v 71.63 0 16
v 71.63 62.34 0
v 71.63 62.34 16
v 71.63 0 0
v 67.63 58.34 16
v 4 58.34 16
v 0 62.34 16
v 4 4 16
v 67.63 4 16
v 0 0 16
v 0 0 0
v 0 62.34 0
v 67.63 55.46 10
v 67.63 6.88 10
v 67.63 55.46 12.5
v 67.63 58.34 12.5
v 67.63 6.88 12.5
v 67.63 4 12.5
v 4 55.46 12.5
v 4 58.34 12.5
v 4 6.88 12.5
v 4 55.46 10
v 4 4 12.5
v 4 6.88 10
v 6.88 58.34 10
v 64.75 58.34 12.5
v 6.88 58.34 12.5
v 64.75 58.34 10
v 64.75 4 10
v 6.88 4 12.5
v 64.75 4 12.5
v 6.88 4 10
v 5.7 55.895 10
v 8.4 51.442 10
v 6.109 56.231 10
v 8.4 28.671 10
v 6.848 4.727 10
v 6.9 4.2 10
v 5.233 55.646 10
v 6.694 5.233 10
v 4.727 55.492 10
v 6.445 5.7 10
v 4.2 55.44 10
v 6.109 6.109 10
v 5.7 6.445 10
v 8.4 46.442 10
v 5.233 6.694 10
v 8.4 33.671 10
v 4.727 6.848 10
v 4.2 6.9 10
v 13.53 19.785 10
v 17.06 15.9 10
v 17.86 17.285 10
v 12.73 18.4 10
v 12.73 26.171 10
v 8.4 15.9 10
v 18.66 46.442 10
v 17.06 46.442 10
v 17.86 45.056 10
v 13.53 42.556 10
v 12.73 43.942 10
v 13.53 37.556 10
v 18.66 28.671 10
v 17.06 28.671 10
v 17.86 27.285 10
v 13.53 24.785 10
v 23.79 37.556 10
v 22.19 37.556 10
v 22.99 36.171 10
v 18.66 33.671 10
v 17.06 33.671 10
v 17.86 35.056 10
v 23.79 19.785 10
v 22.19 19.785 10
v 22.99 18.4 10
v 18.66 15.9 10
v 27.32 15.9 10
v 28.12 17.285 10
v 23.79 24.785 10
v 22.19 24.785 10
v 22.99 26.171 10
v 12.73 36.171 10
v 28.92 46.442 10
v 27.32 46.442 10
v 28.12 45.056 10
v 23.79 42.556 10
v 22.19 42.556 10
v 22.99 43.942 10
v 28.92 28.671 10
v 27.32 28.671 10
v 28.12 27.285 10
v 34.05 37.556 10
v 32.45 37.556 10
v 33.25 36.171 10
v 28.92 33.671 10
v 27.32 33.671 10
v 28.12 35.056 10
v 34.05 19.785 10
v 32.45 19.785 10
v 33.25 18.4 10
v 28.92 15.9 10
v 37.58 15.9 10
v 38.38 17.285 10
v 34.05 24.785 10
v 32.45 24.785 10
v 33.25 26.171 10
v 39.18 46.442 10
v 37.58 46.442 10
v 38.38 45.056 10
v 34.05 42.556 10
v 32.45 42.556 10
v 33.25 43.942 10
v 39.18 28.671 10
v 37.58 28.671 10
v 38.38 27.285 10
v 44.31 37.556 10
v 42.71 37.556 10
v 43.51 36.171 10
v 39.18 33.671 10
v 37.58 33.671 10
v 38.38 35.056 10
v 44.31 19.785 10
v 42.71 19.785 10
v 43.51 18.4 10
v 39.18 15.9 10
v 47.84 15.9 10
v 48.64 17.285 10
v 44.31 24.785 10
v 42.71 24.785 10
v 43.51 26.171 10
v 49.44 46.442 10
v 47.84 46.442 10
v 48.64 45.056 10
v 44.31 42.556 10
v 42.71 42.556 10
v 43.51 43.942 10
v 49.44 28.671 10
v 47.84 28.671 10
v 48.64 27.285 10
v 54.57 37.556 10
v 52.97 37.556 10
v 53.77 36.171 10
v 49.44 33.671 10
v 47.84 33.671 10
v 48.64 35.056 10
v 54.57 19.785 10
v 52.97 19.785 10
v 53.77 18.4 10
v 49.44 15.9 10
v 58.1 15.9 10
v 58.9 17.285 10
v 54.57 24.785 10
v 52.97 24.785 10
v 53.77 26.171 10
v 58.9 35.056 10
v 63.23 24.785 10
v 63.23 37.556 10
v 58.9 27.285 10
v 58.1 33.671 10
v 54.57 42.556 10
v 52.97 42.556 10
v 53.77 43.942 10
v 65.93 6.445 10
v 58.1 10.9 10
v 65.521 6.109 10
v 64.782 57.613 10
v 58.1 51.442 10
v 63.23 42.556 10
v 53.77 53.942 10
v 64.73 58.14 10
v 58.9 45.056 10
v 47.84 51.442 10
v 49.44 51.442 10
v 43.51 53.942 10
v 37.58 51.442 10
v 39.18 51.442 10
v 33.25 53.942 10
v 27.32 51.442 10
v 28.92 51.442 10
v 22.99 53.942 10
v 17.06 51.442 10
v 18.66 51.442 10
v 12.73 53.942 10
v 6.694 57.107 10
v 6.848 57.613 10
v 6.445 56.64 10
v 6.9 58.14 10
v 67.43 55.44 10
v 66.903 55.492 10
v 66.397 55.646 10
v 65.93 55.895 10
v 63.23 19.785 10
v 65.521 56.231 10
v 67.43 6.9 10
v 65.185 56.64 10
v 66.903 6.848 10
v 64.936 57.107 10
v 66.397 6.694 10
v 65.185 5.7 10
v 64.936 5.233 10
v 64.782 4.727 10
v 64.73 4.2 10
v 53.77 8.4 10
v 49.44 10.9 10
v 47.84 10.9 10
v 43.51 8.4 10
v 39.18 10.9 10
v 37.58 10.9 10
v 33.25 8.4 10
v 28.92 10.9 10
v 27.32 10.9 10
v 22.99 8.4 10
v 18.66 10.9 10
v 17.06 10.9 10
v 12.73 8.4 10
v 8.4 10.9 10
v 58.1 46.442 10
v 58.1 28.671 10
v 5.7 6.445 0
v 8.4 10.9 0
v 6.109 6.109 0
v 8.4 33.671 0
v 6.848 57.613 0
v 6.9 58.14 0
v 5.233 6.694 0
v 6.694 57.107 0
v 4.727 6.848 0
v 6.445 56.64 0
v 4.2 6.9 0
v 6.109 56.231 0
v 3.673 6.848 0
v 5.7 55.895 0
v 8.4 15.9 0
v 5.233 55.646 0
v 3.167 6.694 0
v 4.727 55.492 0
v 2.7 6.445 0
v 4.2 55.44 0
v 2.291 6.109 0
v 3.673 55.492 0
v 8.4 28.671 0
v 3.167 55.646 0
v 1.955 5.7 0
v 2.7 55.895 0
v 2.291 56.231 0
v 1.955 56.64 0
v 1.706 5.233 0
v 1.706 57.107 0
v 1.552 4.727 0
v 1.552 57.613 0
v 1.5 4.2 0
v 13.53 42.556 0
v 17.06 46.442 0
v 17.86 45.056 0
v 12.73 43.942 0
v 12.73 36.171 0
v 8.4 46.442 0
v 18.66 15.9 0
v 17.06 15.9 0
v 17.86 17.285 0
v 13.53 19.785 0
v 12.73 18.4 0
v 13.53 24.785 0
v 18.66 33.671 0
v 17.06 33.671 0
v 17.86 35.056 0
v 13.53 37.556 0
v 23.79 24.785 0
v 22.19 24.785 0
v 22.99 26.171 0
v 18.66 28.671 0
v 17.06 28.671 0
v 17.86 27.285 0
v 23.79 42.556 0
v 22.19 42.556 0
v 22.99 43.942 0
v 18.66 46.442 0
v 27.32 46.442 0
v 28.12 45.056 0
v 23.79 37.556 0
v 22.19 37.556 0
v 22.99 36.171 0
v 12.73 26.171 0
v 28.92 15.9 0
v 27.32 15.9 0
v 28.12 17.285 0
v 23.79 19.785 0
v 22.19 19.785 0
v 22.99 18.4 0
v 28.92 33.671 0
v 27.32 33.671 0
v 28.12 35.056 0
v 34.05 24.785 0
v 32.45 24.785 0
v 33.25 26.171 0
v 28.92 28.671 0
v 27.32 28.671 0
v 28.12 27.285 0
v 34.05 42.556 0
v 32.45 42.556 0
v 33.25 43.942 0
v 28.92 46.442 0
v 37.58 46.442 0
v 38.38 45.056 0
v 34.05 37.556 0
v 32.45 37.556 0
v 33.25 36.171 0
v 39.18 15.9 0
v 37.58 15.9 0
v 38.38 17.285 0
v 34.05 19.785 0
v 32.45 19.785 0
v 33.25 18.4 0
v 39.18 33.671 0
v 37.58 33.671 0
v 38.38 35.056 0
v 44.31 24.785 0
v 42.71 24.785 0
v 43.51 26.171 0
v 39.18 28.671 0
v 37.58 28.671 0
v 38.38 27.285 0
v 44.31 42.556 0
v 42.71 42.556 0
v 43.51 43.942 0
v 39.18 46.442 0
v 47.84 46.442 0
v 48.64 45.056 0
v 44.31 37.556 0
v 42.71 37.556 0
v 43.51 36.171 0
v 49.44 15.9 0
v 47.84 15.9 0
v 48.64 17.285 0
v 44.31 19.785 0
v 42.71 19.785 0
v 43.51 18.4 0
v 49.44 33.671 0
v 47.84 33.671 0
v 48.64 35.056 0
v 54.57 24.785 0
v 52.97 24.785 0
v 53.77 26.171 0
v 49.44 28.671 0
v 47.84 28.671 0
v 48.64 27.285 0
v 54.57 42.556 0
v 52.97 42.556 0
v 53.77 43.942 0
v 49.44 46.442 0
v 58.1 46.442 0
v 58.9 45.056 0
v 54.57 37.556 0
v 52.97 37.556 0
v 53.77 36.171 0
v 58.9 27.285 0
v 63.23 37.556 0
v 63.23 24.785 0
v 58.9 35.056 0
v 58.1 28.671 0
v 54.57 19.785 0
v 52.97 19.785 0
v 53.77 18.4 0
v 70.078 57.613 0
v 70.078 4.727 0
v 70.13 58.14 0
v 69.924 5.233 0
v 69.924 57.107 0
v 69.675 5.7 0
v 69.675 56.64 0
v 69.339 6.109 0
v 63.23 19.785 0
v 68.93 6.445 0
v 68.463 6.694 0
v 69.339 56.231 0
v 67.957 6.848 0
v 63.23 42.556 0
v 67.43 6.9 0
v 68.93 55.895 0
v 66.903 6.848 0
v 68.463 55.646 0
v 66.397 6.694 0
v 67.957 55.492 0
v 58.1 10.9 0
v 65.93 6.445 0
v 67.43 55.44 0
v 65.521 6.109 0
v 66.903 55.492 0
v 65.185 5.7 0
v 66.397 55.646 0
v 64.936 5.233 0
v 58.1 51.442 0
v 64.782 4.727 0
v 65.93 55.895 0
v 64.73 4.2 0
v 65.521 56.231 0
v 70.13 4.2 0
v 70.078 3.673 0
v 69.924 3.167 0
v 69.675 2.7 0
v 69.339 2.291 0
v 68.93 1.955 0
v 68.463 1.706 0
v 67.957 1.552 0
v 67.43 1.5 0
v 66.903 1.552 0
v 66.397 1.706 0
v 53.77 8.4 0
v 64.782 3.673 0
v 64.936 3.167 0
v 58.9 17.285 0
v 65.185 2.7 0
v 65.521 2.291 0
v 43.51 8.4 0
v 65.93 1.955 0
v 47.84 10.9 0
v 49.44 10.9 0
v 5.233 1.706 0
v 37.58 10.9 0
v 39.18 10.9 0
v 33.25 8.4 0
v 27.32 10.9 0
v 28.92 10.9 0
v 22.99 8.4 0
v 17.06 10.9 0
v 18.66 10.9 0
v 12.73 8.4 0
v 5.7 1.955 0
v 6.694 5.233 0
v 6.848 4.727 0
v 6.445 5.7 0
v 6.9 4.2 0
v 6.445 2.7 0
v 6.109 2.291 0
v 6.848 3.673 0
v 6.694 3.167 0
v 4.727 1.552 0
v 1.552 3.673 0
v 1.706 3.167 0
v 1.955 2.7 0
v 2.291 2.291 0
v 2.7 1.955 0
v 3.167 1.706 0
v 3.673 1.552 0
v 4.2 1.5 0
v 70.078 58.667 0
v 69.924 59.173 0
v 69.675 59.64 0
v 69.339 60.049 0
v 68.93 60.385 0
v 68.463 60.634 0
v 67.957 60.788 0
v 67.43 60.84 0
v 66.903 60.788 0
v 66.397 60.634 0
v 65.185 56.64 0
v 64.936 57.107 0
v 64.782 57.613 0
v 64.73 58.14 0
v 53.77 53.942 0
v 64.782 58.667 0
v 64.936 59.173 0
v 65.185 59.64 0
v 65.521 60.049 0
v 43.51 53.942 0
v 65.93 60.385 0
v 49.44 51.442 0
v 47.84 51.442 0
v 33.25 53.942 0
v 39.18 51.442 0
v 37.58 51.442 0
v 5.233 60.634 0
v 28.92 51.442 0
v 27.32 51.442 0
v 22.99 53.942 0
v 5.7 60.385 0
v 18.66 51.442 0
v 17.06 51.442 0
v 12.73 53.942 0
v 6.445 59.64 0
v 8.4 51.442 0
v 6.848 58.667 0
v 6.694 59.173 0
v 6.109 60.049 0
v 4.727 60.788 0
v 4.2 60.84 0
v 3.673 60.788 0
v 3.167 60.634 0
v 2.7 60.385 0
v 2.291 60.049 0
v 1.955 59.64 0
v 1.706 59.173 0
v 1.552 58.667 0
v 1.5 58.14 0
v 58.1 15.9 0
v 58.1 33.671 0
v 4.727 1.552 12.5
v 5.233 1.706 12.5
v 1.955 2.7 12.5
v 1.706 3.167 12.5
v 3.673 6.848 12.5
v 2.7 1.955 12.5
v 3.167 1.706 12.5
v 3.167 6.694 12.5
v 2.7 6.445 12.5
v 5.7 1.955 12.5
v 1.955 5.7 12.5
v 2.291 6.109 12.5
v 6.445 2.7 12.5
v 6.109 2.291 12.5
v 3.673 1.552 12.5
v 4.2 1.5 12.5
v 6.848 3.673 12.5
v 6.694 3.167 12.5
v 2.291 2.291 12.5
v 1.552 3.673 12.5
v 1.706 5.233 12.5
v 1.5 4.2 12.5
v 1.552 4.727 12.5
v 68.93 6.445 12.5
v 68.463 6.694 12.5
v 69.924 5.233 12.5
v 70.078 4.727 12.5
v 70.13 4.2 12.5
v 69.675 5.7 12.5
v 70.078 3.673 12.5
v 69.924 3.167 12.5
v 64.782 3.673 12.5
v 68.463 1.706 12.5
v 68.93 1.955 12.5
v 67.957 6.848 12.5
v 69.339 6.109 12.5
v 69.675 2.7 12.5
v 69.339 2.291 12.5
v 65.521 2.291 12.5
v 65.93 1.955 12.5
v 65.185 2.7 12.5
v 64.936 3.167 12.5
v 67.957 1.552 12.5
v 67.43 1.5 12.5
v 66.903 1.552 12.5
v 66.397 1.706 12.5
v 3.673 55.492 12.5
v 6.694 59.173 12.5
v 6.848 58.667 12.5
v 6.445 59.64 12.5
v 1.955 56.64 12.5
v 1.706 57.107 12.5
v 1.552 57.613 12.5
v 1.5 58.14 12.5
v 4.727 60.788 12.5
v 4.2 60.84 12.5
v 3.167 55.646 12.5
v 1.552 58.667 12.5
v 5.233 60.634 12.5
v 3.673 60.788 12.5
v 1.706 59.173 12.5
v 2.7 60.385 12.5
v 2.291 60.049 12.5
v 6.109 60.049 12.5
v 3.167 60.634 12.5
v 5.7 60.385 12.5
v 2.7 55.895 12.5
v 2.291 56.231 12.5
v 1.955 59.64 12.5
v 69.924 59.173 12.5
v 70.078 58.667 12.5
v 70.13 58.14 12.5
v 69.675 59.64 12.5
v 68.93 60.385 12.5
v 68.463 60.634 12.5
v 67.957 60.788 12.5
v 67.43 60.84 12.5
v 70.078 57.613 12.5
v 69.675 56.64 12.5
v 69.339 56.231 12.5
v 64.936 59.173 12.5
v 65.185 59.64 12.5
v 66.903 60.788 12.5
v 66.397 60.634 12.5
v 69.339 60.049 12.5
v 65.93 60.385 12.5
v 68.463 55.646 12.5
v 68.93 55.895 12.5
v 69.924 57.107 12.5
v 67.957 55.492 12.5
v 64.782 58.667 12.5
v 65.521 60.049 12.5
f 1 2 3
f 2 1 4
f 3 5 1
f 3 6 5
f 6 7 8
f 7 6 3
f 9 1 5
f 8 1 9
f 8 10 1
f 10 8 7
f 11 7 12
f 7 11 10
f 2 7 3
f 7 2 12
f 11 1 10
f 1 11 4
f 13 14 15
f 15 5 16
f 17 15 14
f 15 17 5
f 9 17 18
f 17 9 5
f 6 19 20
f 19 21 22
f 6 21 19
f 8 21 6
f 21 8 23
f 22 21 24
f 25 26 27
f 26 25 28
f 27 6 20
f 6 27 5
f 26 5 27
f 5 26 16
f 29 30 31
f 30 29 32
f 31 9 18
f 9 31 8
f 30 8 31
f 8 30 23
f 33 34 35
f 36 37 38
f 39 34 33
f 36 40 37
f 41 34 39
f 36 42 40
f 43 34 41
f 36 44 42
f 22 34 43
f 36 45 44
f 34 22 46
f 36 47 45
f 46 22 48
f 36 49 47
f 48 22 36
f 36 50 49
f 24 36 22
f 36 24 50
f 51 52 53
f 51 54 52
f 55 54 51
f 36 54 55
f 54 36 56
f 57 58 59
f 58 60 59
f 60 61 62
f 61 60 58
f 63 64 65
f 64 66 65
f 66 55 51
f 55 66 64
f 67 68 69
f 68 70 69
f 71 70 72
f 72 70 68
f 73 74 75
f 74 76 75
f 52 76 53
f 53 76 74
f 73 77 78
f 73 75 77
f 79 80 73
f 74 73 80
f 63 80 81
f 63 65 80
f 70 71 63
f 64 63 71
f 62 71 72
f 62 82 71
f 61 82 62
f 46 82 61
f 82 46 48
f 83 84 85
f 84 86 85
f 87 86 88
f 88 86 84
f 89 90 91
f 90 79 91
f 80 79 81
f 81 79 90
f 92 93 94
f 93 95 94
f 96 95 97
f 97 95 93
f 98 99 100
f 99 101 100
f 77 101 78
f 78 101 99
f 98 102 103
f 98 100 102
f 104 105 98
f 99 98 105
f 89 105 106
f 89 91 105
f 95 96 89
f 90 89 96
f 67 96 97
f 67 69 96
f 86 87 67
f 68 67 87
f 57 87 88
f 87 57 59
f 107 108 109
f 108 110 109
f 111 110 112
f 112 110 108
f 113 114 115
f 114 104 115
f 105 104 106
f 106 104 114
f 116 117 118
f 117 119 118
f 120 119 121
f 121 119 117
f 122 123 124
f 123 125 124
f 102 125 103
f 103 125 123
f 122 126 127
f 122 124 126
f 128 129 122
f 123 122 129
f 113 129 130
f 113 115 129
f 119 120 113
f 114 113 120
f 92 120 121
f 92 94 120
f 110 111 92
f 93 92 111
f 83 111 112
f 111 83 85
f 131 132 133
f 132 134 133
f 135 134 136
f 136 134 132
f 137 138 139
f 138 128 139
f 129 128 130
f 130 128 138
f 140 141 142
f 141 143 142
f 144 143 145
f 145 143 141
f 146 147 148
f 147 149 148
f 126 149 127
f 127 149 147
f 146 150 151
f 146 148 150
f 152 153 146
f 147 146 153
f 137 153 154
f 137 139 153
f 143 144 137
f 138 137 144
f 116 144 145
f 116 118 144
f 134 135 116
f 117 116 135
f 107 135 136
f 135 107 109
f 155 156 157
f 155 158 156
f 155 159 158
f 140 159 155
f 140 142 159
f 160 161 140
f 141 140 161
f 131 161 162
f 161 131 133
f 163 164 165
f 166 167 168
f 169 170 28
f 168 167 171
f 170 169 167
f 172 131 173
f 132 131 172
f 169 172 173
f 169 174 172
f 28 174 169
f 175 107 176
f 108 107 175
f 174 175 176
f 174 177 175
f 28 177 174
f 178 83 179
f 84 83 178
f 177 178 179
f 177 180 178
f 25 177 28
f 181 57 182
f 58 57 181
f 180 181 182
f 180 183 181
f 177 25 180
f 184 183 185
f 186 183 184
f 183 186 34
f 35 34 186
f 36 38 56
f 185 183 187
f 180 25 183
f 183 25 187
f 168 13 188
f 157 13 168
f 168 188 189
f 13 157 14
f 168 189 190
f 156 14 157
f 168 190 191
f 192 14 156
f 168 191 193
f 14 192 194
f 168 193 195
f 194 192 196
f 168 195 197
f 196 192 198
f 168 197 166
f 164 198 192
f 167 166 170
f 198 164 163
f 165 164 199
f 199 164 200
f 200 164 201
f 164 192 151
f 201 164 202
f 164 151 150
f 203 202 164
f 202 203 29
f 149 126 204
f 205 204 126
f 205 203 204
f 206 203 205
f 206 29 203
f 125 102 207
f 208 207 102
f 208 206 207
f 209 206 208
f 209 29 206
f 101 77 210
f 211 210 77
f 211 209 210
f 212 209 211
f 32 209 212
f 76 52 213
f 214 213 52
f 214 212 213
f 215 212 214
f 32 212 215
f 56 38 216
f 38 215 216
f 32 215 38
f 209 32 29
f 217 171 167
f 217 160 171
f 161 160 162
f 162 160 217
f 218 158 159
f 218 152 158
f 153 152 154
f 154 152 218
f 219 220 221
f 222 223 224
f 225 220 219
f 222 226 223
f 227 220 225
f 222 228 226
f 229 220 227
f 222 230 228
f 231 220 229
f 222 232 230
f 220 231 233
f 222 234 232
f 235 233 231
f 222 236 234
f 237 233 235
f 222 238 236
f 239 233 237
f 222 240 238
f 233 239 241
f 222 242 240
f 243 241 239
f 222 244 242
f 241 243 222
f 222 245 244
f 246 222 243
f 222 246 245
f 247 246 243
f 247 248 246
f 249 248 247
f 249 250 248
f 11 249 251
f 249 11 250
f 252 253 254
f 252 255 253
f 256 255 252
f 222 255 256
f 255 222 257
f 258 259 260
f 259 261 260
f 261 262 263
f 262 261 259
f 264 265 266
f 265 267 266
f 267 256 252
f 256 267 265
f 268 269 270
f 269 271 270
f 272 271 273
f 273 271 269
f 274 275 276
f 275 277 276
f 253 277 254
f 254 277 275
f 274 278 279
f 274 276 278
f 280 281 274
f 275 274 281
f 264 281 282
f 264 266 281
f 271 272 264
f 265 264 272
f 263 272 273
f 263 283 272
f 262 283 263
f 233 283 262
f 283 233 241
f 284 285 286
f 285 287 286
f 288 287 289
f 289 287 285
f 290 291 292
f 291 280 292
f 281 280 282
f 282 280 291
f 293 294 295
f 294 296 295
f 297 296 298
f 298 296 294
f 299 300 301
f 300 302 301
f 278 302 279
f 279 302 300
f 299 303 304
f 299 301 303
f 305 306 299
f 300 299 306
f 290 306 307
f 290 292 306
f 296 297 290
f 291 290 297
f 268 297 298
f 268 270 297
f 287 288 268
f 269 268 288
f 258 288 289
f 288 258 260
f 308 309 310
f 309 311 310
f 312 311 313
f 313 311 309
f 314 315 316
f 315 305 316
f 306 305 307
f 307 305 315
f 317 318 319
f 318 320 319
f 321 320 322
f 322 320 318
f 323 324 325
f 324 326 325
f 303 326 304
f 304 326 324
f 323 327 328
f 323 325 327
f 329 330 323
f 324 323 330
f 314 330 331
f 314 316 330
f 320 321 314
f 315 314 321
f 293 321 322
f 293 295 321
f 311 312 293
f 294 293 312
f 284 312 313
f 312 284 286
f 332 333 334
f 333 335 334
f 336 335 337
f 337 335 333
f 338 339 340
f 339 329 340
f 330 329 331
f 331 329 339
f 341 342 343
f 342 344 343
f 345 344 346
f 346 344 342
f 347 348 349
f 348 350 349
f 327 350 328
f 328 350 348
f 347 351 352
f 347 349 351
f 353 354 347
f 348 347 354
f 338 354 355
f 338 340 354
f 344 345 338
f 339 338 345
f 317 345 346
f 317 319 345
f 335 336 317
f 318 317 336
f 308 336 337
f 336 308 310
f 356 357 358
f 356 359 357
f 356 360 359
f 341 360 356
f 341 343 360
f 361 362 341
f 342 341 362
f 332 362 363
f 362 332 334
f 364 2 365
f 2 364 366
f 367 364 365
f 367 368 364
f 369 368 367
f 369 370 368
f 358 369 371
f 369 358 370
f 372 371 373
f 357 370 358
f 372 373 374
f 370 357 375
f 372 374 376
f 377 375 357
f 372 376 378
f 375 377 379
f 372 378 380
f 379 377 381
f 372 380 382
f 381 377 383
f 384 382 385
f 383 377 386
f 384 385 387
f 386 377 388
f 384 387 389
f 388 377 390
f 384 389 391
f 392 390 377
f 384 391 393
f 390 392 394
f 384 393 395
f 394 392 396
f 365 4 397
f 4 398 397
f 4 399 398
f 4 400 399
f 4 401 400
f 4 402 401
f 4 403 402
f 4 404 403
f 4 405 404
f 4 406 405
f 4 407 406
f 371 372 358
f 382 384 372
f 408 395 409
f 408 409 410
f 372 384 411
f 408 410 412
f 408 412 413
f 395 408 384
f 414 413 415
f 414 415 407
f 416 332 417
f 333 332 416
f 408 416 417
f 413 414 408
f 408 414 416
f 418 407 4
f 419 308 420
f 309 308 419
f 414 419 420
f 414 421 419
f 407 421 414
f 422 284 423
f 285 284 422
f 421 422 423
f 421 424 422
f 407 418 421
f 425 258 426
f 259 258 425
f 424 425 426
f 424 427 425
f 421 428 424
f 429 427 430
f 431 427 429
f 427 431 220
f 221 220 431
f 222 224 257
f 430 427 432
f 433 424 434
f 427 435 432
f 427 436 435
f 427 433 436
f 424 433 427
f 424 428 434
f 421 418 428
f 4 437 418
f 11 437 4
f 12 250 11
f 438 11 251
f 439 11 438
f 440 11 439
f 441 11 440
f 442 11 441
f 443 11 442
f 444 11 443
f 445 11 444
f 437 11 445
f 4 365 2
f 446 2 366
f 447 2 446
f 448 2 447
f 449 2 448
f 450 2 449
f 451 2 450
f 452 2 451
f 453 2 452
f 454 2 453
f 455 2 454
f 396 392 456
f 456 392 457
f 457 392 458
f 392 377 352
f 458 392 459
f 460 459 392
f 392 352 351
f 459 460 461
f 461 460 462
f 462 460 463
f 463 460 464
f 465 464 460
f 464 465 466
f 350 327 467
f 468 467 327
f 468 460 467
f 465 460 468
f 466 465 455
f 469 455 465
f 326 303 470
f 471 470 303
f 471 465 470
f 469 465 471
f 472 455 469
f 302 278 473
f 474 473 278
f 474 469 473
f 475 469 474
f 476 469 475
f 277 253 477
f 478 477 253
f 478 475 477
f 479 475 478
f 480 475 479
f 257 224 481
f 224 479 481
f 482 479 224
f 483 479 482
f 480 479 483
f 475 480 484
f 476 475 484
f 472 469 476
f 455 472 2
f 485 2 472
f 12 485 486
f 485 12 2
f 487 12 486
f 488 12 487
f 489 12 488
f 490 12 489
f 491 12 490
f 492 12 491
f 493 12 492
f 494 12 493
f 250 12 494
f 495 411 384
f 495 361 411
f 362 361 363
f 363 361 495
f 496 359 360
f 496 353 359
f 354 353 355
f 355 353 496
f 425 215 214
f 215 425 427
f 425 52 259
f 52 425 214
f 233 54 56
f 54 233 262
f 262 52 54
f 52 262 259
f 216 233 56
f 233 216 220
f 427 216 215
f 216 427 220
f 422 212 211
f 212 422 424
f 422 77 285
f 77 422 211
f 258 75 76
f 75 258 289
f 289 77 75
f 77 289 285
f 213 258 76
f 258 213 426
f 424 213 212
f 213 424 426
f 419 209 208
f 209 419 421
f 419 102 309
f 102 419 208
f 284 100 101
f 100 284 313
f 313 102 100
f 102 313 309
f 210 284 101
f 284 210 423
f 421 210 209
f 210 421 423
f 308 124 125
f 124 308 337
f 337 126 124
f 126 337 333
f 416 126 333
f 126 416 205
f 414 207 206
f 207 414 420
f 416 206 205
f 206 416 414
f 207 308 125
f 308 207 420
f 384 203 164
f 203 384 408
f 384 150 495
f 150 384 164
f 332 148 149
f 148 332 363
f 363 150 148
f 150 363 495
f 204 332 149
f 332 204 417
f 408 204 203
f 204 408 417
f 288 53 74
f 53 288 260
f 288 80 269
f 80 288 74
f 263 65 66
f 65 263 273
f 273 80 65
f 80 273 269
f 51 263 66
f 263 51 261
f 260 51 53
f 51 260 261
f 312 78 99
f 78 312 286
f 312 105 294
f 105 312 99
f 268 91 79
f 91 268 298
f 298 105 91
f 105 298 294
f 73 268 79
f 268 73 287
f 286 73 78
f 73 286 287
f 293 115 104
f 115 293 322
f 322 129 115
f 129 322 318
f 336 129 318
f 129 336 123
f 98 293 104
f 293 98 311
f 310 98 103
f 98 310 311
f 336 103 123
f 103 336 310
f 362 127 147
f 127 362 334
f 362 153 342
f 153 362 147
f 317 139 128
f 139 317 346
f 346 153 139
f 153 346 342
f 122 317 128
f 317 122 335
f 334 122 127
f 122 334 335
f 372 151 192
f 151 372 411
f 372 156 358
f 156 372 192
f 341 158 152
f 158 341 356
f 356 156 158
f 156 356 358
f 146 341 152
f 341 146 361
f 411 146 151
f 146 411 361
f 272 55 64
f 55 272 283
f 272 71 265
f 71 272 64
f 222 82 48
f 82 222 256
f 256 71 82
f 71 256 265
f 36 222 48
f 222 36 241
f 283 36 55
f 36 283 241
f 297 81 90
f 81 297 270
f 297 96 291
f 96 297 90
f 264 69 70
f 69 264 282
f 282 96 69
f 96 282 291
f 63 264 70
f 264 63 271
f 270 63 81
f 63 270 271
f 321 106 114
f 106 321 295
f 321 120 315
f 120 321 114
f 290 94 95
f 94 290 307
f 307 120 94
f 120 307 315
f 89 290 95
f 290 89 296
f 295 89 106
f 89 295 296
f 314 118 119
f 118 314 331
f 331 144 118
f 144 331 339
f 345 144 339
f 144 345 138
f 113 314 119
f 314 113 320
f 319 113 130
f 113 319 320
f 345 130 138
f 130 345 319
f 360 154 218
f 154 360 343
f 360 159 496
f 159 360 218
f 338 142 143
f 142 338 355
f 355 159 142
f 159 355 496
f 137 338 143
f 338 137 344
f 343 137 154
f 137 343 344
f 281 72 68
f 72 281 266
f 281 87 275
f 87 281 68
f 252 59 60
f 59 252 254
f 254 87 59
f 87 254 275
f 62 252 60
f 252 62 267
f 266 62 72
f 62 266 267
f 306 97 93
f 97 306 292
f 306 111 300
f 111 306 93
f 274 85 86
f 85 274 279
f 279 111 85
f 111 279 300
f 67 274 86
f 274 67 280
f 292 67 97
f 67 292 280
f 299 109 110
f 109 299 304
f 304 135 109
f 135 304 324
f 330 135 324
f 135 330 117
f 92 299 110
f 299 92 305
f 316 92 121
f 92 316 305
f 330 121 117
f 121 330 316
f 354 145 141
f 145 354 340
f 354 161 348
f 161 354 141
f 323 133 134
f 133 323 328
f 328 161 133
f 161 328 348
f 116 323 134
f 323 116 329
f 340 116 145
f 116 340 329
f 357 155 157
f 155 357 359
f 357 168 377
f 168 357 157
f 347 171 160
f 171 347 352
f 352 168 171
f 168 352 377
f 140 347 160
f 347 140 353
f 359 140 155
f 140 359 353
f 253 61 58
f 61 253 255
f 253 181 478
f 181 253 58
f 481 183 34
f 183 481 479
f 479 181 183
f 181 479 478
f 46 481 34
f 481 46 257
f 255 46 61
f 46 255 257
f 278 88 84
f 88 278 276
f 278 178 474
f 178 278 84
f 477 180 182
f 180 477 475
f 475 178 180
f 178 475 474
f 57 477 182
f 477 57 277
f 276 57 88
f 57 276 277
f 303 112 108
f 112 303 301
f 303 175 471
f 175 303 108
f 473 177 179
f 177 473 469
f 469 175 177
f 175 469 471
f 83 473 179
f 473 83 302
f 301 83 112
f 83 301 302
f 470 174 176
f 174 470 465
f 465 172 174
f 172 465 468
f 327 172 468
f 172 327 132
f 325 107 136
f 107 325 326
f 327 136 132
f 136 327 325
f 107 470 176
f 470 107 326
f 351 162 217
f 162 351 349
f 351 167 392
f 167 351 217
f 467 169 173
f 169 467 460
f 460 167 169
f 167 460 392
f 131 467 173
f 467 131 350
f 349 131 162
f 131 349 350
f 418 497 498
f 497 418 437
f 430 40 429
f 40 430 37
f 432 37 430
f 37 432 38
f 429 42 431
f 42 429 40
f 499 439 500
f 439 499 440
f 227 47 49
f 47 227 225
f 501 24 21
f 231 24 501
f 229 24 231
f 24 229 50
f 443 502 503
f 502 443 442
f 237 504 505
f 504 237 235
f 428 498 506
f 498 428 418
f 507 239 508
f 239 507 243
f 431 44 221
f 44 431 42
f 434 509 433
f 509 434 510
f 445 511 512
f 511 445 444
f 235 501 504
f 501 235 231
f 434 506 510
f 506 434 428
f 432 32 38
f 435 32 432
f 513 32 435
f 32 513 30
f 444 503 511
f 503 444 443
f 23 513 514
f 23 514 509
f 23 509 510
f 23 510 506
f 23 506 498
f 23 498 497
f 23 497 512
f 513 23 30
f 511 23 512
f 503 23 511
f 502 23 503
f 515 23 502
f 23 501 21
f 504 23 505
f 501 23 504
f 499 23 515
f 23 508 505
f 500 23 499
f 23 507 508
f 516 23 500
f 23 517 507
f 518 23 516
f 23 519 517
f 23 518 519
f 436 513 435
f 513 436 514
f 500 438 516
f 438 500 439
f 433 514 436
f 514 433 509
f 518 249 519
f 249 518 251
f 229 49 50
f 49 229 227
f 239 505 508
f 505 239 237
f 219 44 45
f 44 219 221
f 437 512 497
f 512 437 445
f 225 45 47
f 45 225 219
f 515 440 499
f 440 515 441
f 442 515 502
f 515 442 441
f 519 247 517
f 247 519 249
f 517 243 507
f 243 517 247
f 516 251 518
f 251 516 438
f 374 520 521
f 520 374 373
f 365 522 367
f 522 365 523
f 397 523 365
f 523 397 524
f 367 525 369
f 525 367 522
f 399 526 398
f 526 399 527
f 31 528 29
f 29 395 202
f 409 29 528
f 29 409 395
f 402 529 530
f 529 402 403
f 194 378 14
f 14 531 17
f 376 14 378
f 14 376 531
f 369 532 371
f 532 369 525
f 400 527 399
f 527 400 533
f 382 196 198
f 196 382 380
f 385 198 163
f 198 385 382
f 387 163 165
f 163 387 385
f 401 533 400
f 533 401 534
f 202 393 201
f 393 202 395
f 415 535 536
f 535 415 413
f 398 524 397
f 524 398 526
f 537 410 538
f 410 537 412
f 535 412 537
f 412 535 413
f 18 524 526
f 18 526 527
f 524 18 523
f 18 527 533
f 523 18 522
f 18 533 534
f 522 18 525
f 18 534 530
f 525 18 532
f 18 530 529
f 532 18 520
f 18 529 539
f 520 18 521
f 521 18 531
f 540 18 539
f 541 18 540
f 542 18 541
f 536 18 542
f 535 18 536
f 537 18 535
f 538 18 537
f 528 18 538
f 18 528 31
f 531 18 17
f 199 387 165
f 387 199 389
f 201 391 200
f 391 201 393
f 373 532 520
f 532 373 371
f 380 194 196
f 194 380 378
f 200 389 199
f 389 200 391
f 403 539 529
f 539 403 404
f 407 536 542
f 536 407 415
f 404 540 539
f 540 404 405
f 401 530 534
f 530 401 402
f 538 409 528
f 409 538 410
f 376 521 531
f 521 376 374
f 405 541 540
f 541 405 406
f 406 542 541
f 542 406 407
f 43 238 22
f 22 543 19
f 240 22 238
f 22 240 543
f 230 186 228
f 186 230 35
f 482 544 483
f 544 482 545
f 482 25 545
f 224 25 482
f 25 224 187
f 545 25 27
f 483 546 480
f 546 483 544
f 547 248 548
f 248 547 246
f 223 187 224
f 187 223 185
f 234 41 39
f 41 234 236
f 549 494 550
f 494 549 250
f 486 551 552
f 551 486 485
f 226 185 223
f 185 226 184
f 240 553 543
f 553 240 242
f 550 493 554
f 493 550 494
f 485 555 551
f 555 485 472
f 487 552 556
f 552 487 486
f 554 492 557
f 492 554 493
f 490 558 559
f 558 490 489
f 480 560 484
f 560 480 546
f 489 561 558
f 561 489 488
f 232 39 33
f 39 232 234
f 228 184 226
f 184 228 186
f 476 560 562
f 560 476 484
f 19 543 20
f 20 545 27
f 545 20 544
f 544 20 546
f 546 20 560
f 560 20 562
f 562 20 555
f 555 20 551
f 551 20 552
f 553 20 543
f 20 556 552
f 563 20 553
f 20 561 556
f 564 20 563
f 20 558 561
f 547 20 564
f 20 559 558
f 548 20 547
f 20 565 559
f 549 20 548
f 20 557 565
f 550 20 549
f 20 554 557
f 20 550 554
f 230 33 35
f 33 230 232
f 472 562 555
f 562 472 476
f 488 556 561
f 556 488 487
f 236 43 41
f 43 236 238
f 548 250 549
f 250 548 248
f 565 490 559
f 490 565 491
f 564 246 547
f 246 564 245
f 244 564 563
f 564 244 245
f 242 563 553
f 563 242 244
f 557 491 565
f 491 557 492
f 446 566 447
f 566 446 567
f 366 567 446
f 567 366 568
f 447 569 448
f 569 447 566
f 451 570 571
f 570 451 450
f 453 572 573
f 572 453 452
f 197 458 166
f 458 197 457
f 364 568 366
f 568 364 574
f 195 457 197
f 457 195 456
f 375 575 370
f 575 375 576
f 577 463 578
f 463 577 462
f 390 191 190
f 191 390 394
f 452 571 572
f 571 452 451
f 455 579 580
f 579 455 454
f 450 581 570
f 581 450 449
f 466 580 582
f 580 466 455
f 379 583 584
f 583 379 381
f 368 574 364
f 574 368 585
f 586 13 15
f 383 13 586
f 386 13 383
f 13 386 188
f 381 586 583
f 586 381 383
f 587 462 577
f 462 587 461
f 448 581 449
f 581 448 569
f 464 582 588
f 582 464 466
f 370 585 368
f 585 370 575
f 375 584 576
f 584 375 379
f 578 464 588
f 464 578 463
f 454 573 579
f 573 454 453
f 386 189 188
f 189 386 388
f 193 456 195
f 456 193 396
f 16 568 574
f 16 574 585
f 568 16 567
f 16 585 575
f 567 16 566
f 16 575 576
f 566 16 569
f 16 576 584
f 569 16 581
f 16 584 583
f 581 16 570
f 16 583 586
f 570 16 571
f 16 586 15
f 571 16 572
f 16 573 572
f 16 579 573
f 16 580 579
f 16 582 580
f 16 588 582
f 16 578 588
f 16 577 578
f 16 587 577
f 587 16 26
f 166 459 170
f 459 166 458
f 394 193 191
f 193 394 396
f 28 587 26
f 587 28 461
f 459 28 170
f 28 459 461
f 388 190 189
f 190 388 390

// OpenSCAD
$fn = 32;

// ----------------------------------------------------------------------
// Honeycomb panel: 71.63 x 62.34 mm, 25 cells of 10 mm
// ----------------------------------------------------------------------

// --- parameters (mm) ---
panel_w = 71.63;          // panel width
panel_d = 62.34;          // panel depth
thick = 10;               // panel thickness
cell_r = 5;               // hex cell circumradius
pitch = 10.26;            // hex cell pitch (centre to centre)
web = 1.6;                // web between the cells
columns = 5;              // columns of cells
rows = 5;                 // rows of cells
cell_count = 25;          // total cells
shift_x = 12.73;          // first cell offset in x
shift_y = 13.4;           // first cell offset in y
mount_d = 5.4;            // corner mounting holes
hole_off = 4.2;           // mounting hole offset from the corners
rim_h = 16;               // rim height
rim_t = 4;                // rim wall thickness

difference() {
  union() {
    cube([panel_w, panel_d, thick]);
    /* rim around the panel, sunk 1 mm into the plate */
    translate([0, 0, thick - 1]) difference() {
      cube([panel_w, panel_d, rim_h - thick + 1]);
      translate([rim_t, rim_t, -2.5]) cube([panel_w - 2 * rim_t, panel_d - 2 * rim_t, rim_h - thick + 6]);
    }
  }
  /* hexagonal cells, point-up, cut right through the plate */
  for (row = [0 : rows - 1]) {
    for (col = [0 : columns - 1]) {
      translate([shift_x + col * pitch + (row % 2) * pitch / 2, shift_y + row * pitch * 0.866025, -2.5]) rotate([0, 0, 30]) cylinder(h = thick + 5, d = 2 * cell_r, $fn = 6);
    }
  }
  /* corner mounting holes, clear of the outer cell web */
  translate([4.2, 4.2, -2.5]) cylinder(h = thick + 5, d = mount_d);
  translate([67.43, 4.2, -2.5]) cylinder(h = thick + 5, d = mount_d);
  translate([4.2, 58.14, -2.5]) cylinder(h = thick + 5, d = mount_d);
  translate([67.43, 58.14, -2.5]) cylinder(h = thick + 5, d = mount_d);
}
